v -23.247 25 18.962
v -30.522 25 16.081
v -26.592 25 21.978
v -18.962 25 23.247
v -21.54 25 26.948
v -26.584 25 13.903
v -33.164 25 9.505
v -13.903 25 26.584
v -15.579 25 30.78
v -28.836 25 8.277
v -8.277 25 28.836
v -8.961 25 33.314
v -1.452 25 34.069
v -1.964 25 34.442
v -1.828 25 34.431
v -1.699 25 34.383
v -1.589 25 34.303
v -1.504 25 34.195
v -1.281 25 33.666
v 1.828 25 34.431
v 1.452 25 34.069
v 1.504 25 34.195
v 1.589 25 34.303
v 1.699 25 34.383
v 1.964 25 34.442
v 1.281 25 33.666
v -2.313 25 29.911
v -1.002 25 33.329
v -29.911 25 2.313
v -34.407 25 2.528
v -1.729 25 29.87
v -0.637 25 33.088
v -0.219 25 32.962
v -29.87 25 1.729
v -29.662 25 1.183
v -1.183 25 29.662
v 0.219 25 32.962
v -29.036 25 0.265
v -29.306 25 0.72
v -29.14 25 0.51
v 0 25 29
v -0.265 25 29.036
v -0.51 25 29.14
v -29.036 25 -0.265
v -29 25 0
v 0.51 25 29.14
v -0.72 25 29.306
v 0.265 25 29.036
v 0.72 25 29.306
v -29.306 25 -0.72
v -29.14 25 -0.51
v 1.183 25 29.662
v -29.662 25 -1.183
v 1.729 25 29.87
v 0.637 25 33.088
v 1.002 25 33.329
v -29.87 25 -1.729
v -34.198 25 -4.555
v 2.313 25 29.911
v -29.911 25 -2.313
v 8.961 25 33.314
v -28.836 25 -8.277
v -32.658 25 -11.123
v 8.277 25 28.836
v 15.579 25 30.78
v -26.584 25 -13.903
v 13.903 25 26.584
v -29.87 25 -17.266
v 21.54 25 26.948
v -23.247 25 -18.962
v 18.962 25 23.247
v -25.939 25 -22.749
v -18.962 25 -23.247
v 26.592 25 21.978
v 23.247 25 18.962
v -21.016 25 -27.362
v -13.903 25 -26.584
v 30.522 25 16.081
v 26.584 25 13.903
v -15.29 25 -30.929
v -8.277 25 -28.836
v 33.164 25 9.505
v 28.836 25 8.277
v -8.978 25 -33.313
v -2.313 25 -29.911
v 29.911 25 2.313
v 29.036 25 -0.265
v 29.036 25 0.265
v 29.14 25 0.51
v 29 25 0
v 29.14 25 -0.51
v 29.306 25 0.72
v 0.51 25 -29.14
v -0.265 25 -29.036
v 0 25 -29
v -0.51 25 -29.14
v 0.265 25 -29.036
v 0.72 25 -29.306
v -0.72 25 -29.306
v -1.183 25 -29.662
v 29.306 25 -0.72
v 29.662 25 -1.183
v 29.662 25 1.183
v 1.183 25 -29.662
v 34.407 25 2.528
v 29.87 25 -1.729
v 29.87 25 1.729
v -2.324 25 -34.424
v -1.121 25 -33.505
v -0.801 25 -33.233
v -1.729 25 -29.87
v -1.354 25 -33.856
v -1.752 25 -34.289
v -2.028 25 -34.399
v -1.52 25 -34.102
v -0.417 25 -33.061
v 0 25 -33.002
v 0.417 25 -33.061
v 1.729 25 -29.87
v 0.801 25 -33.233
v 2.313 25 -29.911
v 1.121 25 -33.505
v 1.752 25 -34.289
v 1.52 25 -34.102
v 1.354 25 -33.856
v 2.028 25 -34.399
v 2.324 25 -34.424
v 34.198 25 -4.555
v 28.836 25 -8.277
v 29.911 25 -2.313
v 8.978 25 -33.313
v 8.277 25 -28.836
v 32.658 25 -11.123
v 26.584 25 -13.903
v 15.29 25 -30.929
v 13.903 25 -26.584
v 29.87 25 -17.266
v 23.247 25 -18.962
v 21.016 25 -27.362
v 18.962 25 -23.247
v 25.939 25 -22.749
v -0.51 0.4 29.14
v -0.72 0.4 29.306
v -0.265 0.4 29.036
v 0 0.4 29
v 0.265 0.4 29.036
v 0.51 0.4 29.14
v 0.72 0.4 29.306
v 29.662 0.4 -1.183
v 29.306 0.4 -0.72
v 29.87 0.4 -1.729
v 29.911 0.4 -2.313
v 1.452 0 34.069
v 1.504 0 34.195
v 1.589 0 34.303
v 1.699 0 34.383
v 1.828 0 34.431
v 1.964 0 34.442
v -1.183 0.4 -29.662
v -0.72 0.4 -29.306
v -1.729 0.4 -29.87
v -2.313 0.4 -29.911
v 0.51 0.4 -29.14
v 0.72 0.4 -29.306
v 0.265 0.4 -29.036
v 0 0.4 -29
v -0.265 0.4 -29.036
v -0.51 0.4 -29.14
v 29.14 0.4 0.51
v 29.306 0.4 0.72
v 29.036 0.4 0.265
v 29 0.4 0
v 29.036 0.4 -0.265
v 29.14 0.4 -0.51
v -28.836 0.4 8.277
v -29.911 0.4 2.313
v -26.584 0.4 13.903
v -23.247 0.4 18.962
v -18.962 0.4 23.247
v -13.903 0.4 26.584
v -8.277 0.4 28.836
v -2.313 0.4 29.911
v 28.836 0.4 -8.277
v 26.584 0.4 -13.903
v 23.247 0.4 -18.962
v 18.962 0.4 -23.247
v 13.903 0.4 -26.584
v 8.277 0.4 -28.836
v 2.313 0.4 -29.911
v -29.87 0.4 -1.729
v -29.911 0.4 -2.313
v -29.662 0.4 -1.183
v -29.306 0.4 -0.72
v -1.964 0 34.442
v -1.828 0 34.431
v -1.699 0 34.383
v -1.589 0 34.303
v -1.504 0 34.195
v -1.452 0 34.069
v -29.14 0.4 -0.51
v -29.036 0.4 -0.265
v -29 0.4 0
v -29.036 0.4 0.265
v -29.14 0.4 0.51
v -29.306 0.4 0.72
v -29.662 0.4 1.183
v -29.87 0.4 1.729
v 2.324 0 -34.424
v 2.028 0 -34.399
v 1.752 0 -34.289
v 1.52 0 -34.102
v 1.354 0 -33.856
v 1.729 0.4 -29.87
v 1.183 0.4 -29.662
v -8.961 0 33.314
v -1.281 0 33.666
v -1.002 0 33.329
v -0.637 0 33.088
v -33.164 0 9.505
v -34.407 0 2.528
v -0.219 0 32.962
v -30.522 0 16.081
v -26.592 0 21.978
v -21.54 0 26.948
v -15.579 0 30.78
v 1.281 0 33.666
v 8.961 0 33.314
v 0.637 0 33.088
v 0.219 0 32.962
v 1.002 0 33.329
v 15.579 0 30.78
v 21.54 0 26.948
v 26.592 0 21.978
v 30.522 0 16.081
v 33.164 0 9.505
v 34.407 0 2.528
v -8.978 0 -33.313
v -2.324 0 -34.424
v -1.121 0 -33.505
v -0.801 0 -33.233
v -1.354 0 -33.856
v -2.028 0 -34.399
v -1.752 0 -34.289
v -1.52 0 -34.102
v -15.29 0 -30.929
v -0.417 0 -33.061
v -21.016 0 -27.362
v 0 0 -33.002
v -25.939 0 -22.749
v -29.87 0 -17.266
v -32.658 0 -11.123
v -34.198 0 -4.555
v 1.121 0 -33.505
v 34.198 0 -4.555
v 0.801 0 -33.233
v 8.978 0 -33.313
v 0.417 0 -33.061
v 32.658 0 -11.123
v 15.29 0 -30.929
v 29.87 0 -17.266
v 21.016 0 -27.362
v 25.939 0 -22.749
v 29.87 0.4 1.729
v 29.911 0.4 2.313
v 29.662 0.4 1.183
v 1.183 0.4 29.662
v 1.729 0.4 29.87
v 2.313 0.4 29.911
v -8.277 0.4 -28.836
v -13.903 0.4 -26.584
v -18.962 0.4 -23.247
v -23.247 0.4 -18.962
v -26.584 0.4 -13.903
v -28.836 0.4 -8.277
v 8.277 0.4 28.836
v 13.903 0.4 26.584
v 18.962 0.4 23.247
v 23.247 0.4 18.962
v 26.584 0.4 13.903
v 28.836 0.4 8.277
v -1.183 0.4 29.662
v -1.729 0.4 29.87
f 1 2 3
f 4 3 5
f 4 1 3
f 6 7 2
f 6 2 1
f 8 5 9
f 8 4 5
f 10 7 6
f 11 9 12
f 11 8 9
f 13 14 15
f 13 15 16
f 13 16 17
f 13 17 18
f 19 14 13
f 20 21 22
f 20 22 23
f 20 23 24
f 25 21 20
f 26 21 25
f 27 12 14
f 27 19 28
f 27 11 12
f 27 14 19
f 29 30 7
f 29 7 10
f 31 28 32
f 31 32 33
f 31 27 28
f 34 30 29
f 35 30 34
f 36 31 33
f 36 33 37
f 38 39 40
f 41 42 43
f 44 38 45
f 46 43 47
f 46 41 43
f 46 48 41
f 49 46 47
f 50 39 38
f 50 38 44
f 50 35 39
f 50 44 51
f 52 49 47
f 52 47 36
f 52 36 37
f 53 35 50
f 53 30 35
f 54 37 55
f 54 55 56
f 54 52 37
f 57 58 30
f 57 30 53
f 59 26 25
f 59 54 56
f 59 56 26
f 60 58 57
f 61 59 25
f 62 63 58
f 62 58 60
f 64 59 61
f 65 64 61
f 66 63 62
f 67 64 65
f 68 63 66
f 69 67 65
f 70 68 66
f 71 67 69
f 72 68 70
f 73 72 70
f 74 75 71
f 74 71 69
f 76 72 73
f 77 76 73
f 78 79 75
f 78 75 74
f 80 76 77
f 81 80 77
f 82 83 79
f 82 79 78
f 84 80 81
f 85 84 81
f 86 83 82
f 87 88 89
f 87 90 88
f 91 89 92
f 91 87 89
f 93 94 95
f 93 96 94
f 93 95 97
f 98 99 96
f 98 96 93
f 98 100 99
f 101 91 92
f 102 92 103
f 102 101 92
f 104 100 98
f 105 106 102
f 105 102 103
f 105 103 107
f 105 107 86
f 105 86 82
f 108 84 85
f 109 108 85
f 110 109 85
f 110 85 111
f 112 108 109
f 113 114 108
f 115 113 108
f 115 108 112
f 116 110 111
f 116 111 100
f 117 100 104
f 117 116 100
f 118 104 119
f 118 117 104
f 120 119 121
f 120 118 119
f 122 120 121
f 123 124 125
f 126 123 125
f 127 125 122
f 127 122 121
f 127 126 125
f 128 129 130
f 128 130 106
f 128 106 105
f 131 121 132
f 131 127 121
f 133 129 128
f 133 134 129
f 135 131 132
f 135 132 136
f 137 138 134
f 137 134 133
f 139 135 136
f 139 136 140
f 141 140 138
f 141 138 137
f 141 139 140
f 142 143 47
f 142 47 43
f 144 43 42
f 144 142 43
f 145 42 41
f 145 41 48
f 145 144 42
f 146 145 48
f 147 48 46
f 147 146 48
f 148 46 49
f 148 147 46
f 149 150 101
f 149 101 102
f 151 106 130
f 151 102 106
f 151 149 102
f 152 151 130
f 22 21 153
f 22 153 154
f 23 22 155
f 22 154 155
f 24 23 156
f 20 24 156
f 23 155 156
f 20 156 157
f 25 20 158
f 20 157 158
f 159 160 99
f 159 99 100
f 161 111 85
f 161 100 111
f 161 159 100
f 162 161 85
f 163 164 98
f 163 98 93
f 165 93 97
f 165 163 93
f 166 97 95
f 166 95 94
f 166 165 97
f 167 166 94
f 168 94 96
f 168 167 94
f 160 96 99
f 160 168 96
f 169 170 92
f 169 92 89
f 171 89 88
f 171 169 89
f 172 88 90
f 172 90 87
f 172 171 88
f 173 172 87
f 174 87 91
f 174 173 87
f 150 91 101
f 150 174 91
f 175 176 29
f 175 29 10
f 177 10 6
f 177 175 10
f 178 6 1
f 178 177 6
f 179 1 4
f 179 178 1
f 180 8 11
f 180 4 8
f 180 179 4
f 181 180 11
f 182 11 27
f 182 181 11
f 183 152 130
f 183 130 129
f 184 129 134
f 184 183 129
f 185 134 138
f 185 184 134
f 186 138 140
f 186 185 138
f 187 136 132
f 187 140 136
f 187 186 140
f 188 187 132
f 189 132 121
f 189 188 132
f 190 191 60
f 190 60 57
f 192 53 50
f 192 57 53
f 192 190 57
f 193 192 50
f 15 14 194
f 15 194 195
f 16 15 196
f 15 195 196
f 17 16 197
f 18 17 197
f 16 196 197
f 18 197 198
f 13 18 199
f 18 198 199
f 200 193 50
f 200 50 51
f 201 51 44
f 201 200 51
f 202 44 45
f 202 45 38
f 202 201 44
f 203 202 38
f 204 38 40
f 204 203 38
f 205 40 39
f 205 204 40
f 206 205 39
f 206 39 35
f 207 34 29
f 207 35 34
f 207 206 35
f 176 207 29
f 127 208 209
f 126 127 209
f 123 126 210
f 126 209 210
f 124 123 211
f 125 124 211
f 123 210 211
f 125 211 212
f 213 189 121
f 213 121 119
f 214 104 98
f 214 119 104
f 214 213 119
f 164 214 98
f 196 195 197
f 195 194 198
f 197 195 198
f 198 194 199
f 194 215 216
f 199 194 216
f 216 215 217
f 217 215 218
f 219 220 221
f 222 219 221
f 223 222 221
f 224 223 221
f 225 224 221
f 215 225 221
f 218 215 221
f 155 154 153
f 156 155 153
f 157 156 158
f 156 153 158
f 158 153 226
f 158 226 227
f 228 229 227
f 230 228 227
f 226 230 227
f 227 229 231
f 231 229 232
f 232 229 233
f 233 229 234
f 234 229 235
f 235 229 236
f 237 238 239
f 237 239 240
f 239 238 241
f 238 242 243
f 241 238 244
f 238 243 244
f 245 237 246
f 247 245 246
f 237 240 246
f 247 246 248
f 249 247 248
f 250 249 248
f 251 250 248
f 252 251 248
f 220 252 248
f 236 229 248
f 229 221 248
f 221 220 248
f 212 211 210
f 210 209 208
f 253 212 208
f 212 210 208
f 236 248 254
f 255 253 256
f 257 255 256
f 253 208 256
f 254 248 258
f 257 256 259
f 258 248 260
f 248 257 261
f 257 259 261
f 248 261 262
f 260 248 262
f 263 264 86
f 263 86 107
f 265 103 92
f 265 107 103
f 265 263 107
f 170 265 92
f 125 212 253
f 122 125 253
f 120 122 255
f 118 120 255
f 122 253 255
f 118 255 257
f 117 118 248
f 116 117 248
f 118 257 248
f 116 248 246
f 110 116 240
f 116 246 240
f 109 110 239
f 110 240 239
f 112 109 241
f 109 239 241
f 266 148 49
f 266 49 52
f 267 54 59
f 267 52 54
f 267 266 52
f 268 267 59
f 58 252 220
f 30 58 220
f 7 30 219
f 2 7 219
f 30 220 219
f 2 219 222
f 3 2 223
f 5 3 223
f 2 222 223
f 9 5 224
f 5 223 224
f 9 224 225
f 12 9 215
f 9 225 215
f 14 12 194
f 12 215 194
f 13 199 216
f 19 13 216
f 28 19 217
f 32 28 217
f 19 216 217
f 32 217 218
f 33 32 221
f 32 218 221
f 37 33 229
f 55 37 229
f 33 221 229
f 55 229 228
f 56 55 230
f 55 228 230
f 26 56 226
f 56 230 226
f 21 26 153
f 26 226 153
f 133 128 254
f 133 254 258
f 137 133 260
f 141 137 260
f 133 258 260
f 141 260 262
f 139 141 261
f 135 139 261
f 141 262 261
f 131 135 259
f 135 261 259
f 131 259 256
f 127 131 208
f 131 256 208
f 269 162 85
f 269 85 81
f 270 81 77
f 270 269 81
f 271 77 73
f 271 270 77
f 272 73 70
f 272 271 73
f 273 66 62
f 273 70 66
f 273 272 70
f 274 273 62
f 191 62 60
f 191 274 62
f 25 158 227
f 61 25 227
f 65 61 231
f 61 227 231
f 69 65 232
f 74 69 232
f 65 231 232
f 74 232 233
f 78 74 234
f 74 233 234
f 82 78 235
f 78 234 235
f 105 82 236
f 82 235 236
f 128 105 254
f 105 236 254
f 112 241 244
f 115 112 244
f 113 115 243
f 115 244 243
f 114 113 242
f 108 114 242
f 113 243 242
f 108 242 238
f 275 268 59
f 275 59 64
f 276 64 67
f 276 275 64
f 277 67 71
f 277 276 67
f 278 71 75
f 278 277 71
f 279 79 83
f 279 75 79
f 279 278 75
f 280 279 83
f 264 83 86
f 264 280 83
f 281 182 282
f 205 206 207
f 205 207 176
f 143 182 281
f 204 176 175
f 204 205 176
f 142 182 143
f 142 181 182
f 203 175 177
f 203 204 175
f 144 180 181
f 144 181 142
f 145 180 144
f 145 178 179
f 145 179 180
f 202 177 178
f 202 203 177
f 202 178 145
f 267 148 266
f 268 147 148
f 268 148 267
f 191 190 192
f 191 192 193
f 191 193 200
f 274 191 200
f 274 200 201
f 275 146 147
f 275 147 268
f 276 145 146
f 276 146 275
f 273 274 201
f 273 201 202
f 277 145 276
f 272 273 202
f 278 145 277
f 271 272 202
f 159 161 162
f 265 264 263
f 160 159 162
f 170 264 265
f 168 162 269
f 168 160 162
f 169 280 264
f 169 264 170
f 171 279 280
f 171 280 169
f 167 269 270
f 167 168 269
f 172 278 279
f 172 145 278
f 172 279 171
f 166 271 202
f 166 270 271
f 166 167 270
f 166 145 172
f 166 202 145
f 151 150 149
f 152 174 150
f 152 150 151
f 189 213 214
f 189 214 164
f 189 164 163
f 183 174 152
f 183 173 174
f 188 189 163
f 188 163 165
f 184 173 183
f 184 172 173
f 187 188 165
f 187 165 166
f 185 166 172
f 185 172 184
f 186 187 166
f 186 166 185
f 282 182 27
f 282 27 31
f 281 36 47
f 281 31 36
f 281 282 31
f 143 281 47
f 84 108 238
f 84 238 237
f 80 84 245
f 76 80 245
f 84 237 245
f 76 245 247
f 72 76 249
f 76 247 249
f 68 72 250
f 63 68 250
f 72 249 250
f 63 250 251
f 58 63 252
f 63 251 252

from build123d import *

# Parameters (mm, degrees)
BOSS_EXTRUDE1_DEPTH = 25
CUT_EXTRUDE2_DEPTH  = 26
BOSS_EXTRUDE2_DEPTH = 0.4


with BuildPart() as part:
    # Sketch1 → Boss-Extrude1 (new body)
    with BuildSketch(Plane(origin=(0, 0, 0), x_dir=(1, 0, 0), z_dir=(0, 1, 0))):
        with BuildLine():
            ThreePointArc((1.451818925, -34.068556857), (1.641248992, -34.346908706), (1.964225605, -34.442038138))
            ThreePointArc((1.964225605, -34.442038138), (26.591847487, -21.978073076), (34.198225299, 4.555174015))
            ThreePointArc((34.198225299, 4.555174015), (23.590291339, 25.176355888), (2.324135821, 34.423627607))
            ThreePointArc((2.324135821, 34.423627607), (1.751838249, 34.289058819), (1.354061739, 33.856153382))
            ThreePointArc((1.354061739, 33.856153382), (0, 33.001534515), (-1.354061739, 33.856153382))
            ThreePointArc((-1.354061739, 33.856153382), (-1.751838249, 34.289058819), (-2.324135821, 34.423627607))
            ThreePointArc((-2.324135821, 34.423627607), (-23.590291339, 25.176355888), (-34.198225299, 4.555174015))
            ThreePointArc((-34.198225299, 4.555174015), (-26.591847487, -21.978073076), (-1.964225605, -34.442038138))
            ThreePointArc((-1.964225605, -34.442038138), (-1.641248992, -34.346908706), (-1.451818925, -34.068556857))
            ThreePointArc((-1.451818925, -34.068556857), (0, -32.945679925), (1.451818925, -34.068556857))
        make_face()
        with BuildLine():
            Line((-2.417, 3.787737139), (0, 3.787737139))
            Line((0, 3.787737139), (2.417, 3.787737139))
            ThreePointArc((2.417, 3.787737139), (0, -4.489512172), (-2.417, 3.787737139))
        make_face(mode=Mode.SUBTRACT)
    extrude(amount=BOSS_EXTRUDE1_DEPTH)

    # Sketch2 → Cut-Extrude2 (cut, through all)
    with BuildSketch(Plane(origin=(0, 0, 0), x_dir=(1, 0, 0), z_dir=(0, 1, 0))):
        with BuildLine():
            ThreePointArc((-29.910714286, -2.312827473), (-21.213203436, -21.213203436), (-2.312827473, -29.910714286))
            ThreePointArc((-2.312827473, -29.910714286), (-1.448498888, -29.786346067), (-0.719546325, -29.305555556))
            ThreePointArc((-0.719546325, -29.305555556), (0, -29), (0.719546325, -29.305555556))
            ThreePointArc((0.719546325, -29.305555556), (1.448498888, -29.786346067), (2.312827473, -29.910714286))
            ThreePointArc((2.312827473, -29.910714286), (21.213203436, -21.213203436), (29.910714286, -2.312827473))
            ThreePointArc((29.910714286, -2.312827473), (29.786346067, -1.448498888), (29.305555556, -0.719546325))
            ThreePointArc((29.305555556, -0.719546325), (29, 0), (29.305555556, 0.719546325))
            ThreePointArc((29.305555556, 0.719546325), (29.786346067, 1.448498888), (29.910714286, 2.312827473))
            ThreePointArc((29.910714286, 2.312827473), (21.213203436, 21.213203436), (2.312827473, 29.910714286))
            ThreePointArc((2.312827473, 29.910714286), (1.448498888, 29.786346067), (0.719546325, 29.305555556))
            ThreePointArc((0.719546325, 29.305555556), (0, 29), (-0.719546325, 29.305555556))
            ThreePointArc((-0.719546325, 29.305555556), (-1.448498888, 29.786346067), (-2.312827473, 29.910714286))
            ThreePointArc((-2.312827473, 29.910714286), (-21.213203436, 21.213203436), (-29.910714286, 2.312827473))
            ThreePointArc((-29.910714286, 2.312827473), (-29.786346067, 1.448498888), (-29.305555556, 0.719546325))
            ThreePointArc((-29.305555556, 0.719546325), (-29, 0), (-29.305555556, -0.719546325))
            ThreePointArc((-29.305555556, -0.719546325), (-29.786346067, -1.448498888), (-29.910714286, -2.312827473))
        make_face()
    extrude(amount=CUT_EXTRUDE2_DEPTH, mode=Mode.SUBTRACT)

    # Sketch2<2> → Boss-Extrude2 (add)
    with BuildSketch(Plane(origin=(0, 0, 0), x_dir=(1, 0, 0), z_dir=(0, 1, 0))):
        with BuildLine():
            ThreePointArc((-29.910714286, -2.312827473), (-21.213203436, -21.213203436), (-2.312827473, -29.910714286))
            ThreePointArc((-2.312827473, -29.910714286), (-1.448498888, -29.786346067), (-0.719546325, -29.305555556))
            ThreePointArc((-0.719546325, -29.305555556), (0, -29), (0.719546325, -29.305555556))
            ThreePointArc((0.719546325, -29.305555556), (1.448498888, -29.786346067), (2.312827473, -29.910714286))
            ThreePointArc((2.312827473, -29.910714286), (21.213203436, -21.213203436), (29.910714286, -2.312827473))
            ThreePointArc((29.910714286, -2.312827473), (29.786346067, -1.448498888), (29.305555556, -0.719546325))
            ThreePointArc((29.305555556, -0.719546325), (29, 0), (29.305555556, 0.719546325))
            ThreePointArc((29.305555556, 0.719546325), (29.786346067, 1.448498888), (29.910714286, 2.312827473))
            ThreePointArc((29.910714286, 2.312827473), (21.213203436, 21.213203436), (2.312827473, 29.910714286))
            ThreePointArc((2.312827473, 29.910714286), (1.448498888, 29.786346067), (0.719546325, 29.305555556))
            ThreePointArc((0.719546325, 29.305555556), (0, 29), (-0.719546325, 29.305555556))
            ThreePointArc((-0.719546325, 29.305555556), (-1.448498888, 29.786346067), (-2.312827473, 29.910714286))
            ThreePointArc((-2.312827473, 29.910714286), (-21.213203436, 21.213203436), (-29.910714286, 2.312827473))
            ThreePointArc((-29.910714286, 2.312827473), (-29.786346067, 1.448498888), (-29.305555556, 0.719546325))
            ThreePointArc((-29.305555556, 0.719546325), (-29, 0), (-29.305555556, -0.719546325))
            ThreePointArc((-29.305555556, -0.719546325), (-29.786346067, -1.448498888), (-29.910714286, -2.312827473))
        make_face()
    extrude(amount=BOSS_EXTRUDE2_DEPTH)


solid = part.part
